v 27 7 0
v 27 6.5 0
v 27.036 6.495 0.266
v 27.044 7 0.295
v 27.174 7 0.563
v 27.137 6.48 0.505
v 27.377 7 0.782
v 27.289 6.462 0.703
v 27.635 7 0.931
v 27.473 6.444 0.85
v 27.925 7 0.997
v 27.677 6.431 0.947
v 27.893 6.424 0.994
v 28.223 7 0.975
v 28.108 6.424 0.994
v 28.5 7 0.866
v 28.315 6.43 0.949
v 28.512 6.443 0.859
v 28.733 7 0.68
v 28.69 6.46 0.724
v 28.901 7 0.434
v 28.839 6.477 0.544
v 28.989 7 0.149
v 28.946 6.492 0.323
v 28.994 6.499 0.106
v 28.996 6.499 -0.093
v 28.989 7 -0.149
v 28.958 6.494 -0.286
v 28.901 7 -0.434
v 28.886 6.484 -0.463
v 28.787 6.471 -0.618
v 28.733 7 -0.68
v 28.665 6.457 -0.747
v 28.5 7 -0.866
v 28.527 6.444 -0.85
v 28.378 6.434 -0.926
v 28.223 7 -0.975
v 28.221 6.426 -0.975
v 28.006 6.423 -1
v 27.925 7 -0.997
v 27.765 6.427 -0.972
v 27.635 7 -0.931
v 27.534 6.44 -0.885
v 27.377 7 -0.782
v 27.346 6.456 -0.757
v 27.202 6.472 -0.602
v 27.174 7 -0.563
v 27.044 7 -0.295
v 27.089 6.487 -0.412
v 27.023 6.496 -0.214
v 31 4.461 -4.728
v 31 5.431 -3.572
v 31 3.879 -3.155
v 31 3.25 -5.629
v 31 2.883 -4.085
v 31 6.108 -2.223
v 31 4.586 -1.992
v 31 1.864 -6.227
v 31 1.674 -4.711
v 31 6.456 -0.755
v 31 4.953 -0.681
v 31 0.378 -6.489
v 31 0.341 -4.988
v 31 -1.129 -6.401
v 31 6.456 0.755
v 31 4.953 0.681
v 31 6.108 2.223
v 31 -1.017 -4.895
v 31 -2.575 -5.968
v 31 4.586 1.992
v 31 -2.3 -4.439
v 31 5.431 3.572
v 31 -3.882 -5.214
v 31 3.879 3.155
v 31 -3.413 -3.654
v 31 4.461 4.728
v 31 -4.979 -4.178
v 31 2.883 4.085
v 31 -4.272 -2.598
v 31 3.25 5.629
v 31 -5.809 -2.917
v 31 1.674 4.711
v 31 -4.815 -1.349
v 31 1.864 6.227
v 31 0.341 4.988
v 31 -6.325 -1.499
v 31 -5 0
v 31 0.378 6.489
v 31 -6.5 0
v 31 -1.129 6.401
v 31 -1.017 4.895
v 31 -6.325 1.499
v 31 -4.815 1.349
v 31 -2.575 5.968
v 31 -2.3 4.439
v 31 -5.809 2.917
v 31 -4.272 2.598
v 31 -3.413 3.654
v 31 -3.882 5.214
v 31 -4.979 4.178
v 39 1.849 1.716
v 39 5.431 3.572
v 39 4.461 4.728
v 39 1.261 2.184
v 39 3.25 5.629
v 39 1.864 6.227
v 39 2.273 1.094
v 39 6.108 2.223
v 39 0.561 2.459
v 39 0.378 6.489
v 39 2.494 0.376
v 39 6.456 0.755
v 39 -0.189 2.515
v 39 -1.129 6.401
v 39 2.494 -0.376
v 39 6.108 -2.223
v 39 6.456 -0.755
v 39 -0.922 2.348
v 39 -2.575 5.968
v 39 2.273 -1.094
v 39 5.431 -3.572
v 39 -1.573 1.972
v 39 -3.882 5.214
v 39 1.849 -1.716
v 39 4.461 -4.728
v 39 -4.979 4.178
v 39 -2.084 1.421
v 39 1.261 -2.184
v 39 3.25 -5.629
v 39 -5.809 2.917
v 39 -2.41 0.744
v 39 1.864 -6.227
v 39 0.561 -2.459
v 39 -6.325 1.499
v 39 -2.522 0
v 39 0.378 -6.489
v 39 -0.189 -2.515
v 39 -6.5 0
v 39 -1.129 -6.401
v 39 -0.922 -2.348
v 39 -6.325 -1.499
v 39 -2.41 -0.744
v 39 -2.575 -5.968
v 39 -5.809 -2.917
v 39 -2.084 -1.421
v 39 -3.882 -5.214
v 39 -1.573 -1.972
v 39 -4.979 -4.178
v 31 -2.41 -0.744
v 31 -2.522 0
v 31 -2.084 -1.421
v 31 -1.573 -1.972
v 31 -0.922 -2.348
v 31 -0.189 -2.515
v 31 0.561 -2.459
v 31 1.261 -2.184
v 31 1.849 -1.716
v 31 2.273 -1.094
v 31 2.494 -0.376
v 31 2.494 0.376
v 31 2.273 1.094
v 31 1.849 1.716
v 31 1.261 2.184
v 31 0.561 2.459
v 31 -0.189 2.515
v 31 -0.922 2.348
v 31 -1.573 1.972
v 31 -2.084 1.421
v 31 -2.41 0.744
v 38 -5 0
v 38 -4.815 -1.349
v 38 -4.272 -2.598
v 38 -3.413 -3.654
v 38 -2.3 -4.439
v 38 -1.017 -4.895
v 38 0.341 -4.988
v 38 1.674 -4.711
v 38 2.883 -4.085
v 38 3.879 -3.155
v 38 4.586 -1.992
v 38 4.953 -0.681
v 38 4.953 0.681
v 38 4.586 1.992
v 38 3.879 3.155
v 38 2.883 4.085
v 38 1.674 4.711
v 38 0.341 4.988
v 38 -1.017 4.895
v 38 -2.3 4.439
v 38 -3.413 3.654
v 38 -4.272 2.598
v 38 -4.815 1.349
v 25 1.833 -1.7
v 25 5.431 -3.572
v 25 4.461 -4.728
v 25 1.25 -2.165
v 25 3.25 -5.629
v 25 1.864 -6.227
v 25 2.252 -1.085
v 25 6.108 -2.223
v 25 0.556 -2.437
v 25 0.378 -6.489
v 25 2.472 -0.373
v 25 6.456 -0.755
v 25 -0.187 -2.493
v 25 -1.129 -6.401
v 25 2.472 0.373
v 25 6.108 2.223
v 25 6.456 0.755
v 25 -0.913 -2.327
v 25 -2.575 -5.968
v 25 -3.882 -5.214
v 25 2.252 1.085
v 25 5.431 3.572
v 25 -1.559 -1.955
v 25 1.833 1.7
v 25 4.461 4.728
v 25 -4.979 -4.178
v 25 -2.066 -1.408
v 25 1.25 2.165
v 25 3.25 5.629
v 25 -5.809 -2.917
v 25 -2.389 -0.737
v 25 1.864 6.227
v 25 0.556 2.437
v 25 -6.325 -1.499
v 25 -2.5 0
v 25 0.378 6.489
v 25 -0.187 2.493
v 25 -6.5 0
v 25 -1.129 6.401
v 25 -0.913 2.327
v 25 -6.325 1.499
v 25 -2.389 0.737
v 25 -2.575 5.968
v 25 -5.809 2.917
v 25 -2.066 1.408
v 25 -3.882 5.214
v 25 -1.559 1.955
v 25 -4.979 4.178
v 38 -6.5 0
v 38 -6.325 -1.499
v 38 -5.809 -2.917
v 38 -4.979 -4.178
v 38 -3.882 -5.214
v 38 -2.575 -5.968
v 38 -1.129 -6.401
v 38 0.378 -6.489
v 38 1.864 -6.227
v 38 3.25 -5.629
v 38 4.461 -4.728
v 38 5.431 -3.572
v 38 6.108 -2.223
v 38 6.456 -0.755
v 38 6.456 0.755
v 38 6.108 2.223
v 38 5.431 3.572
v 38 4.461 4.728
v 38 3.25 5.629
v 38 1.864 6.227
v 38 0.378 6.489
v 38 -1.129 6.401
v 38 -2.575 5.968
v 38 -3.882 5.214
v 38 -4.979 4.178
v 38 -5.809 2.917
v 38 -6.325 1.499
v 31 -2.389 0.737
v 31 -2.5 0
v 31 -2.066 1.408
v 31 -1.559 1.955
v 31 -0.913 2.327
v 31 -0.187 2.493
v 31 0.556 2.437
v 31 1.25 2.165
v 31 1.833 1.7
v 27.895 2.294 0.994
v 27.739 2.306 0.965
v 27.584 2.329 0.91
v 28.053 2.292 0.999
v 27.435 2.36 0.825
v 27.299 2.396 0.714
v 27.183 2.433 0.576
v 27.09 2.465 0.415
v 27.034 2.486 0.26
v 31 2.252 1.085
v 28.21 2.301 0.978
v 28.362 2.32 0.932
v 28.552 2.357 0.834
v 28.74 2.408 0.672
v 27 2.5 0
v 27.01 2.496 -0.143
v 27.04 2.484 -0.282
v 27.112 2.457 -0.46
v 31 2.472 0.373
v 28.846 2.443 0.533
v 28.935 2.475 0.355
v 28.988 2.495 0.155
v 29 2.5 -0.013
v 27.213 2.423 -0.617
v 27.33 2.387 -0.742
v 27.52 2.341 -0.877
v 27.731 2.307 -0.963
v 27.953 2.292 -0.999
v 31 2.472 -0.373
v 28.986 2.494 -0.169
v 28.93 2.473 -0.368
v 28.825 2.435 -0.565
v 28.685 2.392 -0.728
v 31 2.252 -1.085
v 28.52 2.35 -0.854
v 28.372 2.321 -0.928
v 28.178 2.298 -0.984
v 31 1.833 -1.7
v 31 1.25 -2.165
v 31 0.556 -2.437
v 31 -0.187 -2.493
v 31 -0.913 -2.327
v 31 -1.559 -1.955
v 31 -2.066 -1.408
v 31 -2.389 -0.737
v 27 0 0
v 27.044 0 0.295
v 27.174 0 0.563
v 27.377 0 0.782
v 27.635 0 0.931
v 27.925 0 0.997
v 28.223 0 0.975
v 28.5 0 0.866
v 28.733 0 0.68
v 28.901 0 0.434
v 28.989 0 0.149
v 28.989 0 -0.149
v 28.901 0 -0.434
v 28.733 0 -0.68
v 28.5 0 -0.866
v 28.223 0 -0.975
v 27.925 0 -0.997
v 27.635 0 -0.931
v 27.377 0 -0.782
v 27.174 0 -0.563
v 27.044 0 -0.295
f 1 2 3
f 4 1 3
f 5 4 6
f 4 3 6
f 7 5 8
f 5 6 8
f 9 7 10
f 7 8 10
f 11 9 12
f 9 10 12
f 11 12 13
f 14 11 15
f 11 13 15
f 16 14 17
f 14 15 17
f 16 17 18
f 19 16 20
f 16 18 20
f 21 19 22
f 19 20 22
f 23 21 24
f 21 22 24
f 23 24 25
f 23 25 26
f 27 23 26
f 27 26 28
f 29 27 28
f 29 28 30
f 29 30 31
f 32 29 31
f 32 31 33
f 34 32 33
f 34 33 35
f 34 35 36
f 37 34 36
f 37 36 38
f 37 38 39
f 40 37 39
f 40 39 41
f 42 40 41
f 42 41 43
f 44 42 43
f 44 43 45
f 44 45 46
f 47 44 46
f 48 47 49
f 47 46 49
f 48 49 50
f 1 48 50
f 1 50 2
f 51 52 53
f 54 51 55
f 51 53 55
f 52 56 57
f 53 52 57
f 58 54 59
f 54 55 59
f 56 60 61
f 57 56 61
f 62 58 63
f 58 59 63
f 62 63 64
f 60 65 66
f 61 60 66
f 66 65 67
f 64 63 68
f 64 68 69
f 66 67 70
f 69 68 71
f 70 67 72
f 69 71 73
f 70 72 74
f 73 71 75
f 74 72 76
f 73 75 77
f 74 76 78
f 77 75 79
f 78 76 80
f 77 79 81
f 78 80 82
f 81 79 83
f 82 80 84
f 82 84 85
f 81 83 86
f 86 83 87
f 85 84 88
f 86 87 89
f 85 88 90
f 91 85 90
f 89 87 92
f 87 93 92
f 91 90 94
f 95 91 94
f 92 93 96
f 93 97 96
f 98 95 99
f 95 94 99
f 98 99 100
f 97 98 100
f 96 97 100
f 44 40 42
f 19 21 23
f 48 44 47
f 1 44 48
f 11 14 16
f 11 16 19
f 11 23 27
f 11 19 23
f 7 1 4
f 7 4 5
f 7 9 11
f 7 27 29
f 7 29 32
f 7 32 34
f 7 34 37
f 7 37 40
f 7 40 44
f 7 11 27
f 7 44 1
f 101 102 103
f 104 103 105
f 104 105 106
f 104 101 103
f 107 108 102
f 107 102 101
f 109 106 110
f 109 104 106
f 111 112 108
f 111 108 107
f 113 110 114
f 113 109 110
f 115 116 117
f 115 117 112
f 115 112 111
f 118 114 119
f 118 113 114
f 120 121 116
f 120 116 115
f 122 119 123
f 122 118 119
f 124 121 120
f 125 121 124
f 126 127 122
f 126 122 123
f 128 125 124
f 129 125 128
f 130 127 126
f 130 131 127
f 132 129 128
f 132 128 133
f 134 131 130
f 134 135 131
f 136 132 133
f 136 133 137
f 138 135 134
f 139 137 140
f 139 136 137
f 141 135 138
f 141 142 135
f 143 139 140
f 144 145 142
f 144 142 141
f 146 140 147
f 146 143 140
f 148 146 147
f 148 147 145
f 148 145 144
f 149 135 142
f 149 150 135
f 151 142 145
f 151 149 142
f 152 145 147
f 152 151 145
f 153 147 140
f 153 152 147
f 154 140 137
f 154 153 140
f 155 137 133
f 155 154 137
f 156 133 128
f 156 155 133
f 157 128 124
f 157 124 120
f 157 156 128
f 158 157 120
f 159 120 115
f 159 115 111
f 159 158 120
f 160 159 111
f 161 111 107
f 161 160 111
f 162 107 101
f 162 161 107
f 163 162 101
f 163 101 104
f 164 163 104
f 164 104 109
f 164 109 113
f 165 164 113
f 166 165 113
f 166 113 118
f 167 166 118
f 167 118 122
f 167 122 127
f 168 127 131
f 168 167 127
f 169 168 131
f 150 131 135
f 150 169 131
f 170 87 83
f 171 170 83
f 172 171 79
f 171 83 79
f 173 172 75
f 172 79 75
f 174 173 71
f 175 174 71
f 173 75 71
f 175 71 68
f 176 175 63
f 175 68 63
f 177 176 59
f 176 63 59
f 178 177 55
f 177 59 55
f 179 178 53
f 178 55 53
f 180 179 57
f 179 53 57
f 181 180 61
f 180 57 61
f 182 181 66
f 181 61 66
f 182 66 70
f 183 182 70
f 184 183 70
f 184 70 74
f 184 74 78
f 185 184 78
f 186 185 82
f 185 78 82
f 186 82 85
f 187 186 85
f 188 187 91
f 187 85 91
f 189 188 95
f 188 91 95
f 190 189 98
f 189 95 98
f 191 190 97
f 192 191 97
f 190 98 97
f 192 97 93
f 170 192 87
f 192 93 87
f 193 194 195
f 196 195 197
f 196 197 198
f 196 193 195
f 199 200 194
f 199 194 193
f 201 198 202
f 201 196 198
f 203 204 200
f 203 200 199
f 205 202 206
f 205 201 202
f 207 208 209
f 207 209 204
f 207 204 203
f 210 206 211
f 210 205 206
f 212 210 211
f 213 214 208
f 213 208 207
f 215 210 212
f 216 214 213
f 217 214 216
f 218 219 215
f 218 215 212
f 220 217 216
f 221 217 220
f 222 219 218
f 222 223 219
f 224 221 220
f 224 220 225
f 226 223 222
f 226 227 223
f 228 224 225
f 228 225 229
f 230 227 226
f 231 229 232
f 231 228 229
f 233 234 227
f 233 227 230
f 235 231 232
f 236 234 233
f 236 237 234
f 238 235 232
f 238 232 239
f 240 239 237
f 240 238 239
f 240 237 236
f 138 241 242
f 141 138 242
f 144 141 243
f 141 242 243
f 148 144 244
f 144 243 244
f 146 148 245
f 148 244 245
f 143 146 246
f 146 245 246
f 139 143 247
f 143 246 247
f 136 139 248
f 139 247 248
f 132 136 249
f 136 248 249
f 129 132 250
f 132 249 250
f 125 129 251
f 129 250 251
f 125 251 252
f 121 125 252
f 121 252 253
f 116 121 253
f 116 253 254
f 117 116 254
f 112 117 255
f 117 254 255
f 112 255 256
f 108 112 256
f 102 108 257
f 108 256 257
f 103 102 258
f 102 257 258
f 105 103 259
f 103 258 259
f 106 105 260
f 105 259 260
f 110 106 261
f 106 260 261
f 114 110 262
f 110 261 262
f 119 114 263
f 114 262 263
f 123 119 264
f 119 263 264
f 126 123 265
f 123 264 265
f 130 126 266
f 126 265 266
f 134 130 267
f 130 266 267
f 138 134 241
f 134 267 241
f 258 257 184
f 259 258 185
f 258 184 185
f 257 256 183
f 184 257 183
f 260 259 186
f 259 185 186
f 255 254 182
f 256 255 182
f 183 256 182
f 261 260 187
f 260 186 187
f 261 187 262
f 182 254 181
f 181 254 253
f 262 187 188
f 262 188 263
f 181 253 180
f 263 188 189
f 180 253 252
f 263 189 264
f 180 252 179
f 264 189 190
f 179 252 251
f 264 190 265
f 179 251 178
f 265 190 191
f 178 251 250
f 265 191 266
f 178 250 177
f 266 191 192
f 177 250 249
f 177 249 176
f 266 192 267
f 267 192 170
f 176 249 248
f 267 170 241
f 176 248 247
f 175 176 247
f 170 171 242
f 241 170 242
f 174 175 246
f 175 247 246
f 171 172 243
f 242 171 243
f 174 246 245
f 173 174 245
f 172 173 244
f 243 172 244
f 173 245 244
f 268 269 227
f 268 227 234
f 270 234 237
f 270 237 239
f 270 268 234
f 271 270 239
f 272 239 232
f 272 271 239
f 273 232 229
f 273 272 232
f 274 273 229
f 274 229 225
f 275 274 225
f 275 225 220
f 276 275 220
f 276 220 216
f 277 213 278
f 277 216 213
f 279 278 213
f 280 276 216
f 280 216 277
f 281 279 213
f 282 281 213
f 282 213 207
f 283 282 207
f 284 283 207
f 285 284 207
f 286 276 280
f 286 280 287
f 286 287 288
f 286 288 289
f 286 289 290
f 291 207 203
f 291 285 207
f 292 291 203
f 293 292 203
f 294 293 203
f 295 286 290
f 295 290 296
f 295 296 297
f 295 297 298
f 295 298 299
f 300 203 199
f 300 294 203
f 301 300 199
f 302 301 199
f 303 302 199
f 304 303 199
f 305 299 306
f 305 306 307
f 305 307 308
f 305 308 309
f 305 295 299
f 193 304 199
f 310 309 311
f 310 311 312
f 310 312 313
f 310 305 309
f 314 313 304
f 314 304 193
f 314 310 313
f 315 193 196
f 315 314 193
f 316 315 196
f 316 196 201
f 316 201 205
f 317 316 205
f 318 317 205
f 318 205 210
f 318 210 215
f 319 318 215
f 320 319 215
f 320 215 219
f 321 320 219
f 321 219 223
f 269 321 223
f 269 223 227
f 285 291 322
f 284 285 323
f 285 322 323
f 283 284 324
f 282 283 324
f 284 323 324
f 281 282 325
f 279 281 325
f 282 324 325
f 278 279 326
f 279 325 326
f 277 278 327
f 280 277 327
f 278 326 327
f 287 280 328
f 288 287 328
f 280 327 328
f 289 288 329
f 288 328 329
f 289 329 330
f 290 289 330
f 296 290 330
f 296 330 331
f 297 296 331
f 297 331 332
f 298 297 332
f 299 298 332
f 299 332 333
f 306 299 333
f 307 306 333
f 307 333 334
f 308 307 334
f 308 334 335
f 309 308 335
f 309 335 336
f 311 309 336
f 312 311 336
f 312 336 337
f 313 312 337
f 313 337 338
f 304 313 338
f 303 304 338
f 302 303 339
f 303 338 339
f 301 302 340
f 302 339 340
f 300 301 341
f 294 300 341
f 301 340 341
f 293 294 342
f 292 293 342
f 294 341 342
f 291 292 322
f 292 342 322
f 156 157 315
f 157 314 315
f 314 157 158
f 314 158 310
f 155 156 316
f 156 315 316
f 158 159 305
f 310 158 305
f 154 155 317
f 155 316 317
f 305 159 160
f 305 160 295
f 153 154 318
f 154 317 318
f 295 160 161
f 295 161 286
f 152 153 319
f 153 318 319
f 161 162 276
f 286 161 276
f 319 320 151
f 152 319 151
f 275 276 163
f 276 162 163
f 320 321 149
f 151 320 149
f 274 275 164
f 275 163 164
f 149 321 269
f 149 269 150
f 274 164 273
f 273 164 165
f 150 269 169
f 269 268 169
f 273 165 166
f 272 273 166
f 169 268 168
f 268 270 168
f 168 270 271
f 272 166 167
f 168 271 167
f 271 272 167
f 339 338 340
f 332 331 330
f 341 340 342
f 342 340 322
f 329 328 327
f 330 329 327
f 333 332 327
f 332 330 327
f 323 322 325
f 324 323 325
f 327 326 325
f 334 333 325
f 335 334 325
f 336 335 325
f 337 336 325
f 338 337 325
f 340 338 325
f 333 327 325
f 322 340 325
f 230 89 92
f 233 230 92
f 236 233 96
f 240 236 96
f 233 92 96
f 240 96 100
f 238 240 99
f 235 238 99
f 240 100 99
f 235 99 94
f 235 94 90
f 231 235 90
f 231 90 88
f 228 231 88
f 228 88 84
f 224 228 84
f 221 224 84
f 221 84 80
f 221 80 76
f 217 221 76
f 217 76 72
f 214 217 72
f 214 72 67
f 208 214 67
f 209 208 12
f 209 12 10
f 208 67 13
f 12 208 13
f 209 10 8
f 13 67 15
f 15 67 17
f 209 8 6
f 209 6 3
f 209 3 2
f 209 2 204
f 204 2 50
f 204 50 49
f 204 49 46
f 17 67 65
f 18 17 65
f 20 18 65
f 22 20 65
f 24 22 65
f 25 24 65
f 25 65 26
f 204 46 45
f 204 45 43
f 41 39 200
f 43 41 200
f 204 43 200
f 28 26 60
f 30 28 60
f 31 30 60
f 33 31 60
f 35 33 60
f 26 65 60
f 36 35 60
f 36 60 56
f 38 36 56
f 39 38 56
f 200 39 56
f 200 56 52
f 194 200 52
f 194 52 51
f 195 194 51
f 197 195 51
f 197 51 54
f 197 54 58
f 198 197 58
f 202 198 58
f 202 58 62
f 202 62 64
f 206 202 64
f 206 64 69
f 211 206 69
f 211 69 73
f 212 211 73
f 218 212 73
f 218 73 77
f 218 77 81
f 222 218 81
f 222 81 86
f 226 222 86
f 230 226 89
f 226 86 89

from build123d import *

# Parameters (mm, degrees)
SKETCH019_R             = 6.5
SKETCH019_R_2           = 2.5
PAD010_DEPTH            = 6
SKETCH020_R             = 5
SKETCH020_R_2           = 2.522437
PAD011_DEPTH            = 7
SKETCH021_R             = 6.5
SKETCH021_R_2           = 2.522437
PAD012_DEPTH            = 1
SKETCH022_R             = 1
PAD013_DEPTH            = 7
BODY011_PLACEMENT_ANGLE = 180


with BuildPart() as part:
    # Sketch019 → Pad010 (new body)
    with BuildSketch(Plane.YZ):
        Circle(SKETCH019_R)
        Circle(SKETCH019_R_2, mode=Mode.SUBTRACT)
    extrude(amount=PAD010_DEPTH)

    # Sketch020 (on Face3 of Pad010) → Pad011 (join)
    with BuildSketch(Plane(origin=(0, 0, 0), x_dir=(0, 1, 0), z_dir=(-1, 0, 0))):
        Circle(SKETCH020_R)
        Circle(SKETCH020_R_2, mode=Mode.SUBTRACT)
    extrude(amount=PAD011_DEPTH)

    # Sketch021 (on Face6 of Pad011) → Pad012 (join)
    with BuildSketch(Plane(origin=(-7, 0, 0), x_dir=(0, 1, 0), z_dir=(-1, 0, 0))):
        Circle(SKETCH021_R)
        Circle(SKETCH021_R_2, mode=Mode.SUBTRACT)
    extrude(amount=PAD012_DEPTH)

    # Sketch022 → Pad013 (join)
    with BuildSketch(Plane.XZ):
        with Locations((3, 0)):
            Circle(SKETCH022_R)
    extrude(amount=PAD013_DEPTH)


with BuildPart() as part_1:
    # Body011 placement: moved
    add(part.part.moved(Location((31, 0, 0))).rotate(Axis((31, 0, 0), (0, 0, 1)), BODY011_PLACEMENT_ANGLE))


solid = part_1.part
